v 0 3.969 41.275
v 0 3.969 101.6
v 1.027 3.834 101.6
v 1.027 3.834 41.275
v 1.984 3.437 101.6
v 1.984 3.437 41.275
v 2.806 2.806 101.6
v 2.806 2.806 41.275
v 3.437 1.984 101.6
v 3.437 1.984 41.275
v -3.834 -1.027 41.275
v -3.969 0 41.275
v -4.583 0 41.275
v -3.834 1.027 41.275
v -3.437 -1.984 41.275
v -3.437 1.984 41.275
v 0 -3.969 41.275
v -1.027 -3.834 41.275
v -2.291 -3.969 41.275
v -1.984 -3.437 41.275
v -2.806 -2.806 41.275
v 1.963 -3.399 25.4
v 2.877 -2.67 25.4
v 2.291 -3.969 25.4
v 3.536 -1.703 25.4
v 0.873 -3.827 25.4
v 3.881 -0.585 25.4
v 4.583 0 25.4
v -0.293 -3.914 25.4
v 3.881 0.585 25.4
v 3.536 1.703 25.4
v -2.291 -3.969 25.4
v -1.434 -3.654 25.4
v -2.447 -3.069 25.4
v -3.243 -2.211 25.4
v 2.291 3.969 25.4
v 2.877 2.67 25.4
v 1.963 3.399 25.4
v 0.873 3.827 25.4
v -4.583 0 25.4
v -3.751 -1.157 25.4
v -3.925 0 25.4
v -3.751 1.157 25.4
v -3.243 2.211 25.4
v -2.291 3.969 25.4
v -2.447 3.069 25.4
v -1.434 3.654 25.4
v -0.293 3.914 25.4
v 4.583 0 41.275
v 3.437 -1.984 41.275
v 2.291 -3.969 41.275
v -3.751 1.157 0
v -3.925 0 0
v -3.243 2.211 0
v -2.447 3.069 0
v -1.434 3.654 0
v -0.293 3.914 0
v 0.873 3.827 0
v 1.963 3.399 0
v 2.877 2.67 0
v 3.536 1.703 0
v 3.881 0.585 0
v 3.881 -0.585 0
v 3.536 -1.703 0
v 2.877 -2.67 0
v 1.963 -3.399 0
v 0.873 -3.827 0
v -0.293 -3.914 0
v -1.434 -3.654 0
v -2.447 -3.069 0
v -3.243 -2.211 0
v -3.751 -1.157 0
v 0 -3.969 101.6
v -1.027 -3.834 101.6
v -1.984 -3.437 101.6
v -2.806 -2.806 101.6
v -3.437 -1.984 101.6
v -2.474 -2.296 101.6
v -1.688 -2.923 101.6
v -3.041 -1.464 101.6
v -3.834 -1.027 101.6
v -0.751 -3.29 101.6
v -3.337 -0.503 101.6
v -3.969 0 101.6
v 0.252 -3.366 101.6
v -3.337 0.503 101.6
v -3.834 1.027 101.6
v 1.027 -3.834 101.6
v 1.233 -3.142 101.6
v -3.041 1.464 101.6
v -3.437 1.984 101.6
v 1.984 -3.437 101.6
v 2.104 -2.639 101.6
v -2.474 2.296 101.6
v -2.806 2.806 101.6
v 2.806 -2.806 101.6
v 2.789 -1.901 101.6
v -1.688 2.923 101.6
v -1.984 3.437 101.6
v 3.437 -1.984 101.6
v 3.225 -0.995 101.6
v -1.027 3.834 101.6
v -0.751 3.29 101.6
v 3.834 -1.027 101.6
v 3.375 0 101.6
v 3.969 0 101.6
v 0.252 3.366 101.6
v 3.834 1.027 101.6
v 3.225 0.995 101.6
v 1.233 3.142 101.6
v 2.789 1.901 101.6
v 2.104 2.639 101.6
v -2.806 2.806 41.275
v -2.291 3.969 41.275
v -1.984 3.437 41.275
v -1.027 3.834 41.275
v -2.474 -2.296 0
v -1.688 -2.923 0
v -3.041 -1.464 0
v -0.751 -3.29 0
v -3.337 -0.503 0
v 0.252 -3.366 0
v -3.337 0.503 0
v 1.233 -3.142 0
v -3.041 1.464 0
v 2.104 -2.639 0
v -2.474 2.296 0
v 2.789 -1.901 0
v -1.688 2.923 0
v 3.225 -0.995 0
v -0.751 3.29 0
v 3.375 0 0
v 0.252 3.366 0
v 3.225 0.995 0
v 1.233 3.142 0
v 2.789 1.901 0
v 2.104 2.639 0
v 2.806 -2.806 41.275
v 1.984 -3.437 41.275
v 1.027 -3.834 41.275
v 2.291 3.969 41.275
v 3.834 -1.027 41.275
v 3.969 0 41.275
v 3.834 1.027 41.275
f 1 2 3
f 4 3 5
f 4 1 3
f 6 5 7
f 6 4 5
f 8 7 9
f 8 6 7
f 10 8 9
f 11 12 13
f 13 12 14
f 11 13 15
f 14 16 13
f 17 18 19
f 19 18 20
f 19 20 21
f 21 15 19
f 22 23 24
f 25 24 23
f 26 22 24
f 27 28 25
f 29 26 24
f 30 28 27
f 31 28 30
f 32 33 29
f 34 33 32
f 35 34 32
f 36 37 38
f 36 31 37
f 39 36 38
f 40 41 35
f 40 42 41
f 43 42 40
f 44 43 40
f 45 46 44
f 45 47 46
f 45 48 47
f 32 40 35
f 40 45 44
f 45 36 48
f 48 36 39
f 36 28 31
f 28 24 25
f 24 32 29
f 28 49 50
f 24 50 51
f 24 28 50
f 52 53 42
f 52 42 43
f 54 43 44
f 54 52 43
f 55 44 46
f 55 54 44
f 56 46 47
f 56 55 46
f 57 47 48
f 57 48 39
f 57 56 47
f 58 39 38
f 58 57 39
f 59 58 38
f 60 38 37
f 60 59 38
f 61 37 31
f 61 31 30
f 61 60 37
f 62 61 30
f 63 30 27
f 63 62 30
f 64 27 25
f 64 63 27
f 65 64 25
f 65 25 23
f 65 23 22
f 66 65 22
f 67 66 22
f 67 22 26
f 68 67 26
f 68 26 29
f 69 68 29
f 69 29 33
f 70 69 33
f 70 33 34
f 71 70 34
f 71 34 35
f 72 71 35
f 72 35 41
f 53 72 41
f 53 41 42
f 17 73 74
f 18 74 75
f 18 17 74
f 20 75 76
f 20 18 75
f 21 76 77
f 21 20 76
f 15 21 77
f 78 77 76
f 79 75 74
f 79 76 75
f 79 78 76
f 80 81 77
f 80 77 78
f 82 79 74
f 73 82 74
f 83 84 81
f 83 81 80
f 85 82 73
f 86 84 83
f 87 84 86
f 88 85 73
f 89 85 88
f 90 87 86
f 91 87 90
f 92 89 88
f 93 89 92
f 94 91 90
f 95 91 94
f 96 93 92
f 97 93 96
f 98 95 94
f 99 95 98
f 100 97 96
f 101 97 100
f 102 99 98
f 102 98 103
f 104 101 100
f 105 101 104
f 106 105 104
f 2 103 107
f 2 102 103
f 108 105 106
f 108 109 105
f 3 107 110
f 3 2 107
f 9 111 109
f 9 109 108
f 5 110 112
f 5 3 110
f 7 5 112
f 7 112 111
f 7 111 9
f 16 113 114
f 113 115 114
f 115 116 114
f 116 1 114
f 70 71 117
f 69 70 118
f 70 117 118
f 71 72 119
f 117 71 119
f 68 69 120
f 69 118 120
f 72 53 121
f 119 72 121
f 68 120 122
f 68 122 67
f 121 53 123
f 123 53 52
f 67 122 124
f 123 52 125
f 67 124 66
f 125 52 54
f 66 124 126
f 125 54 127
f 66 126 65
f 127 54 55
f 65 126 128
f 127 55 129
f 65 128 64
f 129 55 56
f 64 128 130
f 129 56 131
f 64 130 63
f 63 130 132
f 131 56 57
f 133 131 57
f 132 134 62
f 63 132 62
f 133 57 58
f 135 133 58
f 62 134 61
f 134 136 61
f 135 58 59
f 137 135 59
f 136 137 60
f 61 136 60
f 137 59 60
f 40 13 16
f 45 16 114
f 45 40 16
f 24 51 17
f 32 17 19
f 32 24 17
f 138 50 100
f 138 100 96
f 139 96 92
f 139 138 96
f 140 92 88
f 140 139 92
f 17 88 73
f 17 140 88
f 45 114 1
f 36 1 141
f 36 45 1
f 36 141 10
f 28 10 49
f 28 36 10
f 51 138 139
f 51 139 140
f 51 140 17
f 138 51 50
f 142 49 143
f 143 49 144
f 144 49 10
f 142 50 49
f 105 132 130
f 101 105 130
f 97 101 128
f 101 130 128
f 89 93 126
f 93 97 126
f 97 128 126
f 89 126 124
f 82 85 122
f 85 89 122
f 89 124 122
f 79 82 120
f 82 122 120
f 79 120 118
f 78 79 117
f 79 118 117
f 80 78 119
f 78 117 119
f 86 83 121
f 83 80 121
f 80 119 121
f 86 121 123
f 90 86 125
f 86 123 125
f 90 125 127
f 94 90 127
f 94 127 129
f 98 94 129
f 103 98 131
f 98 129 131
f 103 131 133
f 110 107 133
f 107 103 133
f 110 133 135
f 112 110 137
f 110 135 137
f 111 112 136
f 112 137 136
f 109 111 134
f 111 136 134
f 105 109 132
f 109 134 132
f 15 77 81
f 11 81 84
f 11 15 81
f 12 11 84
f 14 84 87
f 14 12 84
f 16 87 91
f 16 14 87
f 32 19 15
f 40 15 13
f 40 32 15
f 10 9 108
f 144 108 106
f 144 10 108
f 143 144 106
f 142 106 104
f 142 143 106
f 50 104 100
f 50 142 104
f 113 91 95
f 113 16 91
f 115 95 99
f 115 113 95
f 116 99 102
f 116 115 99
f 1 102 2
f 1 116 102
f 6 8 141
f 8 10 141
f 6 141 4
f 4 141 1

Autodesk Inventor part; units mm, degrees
ref_plane "YZ Plane" through (0, 0, 0) normal (1, 0, 0) x (0, 1, 0)
ref_plane "XZ Plane" through (0, 0, 0) normal (0, 1, 0) x (-1, 0, 0)
sketch "Sketch1" plane through (0, 0, 0) normal (0, 0, 1) x (1, 0, 0)
  line L0 (2.2914, 3.9688) -> (4.5827, 0)
  line L1 (4.5827, 0) -> (2.2914, -3.9687)
  line L2 (2.2914, -3.9687) -> (-2.2914, -3.9687)
  line L3 (-2.2914, -3.9687) -> (-4.5827, 0)
  line L4 (-4.5827, 0) -> (-2.2914, 3.9688)
  line L5 (-2.2914, 3.9688) -> (2.2914, 3.9688)
  circle A0 centre (0, 0) radius 3.375
  dimension "d0" = 7.9375
  dimension "d1" = 6.75
extrude "Extrusion1" add sketch "Sketch1" along normal blind 101.6
sketch "Sketch2" plane through (0, 0, 0) normal (0, 0, -1) x (-1, 0, 0)
  circle A0 centre (0, 0) radius 3.925
  line L0 (2.2914, 3.9688) -> (4.5827, 0) projected
  line L1 (-2.2914, 3.9688) -> (2.2914, 3.9688) projected
  line L2 (-4.5827, 0) -> (-2.2914, 3.9688) projected
  line L3 (-2.2914, -3.9687) -> (-4.5827, 0) projected
  line L4 (2.2914, -3.9687) -> (-2.2914, -3.9687) projected
  line L5 (4.5827, 0) -> (2.2914, -3.9687) projected
  circle A1 centre (0, 0) radius 3.375 projected
  dimension "d4" = 7.85
extrude "Extrusion2" cut sketch "Sketch2" against normal blind 25.4 contours L0 L5 L4 L3 L2 L1
ref_plane "Work Plane1" through (0, 0, 41.275) normal (0, 0, -1) x (-1, 0, 0)
sketch "Sketch3" plane through (0, 0, 41.275) normal (0, 0, -1) x (-1, 0, 0)
  line L0 (-4.5827, 0) -> (-2.2914, 3.9688) projected
  line L1 (-2.2914, -3.9687) -> (-4.5827, 0) projected
  line L2 (2.2914, -3.9687) -> (-2.2914, -3.9687) projected
  line L3 (4.5827, 0) -> (2.2914, -3.9687) projected
  line L4 (2.2914, 3.9688) -> (4.5827, 0) projected
  line L5 (-2.2914, 3.9688) -> (2.2914, 3.9688) projected
  circle A0 centre (0, 0) radius 3.925 projected
  circle A1 centre (0, 0) radius 3.9688
  point P0 (-3.437, -1.9844)
  point P1 (-3.437, 1.9844)
  point P2 (0, 3.9688)
  point P3 (3.437, 1.9844)
  point P4 (3.437, -1.9844)
  point P5 (0, -3.9688)
extrude "Extrusion3" cut sketch "Sketch3" against normal through all contours L0 A1 L1 | L0 L5 A1 | A1 L2 L1 | L5 L4 A1 | A1 L3 L2 | L4 L3 A1
properties part number "Shaft" material "Stainless Steel"
